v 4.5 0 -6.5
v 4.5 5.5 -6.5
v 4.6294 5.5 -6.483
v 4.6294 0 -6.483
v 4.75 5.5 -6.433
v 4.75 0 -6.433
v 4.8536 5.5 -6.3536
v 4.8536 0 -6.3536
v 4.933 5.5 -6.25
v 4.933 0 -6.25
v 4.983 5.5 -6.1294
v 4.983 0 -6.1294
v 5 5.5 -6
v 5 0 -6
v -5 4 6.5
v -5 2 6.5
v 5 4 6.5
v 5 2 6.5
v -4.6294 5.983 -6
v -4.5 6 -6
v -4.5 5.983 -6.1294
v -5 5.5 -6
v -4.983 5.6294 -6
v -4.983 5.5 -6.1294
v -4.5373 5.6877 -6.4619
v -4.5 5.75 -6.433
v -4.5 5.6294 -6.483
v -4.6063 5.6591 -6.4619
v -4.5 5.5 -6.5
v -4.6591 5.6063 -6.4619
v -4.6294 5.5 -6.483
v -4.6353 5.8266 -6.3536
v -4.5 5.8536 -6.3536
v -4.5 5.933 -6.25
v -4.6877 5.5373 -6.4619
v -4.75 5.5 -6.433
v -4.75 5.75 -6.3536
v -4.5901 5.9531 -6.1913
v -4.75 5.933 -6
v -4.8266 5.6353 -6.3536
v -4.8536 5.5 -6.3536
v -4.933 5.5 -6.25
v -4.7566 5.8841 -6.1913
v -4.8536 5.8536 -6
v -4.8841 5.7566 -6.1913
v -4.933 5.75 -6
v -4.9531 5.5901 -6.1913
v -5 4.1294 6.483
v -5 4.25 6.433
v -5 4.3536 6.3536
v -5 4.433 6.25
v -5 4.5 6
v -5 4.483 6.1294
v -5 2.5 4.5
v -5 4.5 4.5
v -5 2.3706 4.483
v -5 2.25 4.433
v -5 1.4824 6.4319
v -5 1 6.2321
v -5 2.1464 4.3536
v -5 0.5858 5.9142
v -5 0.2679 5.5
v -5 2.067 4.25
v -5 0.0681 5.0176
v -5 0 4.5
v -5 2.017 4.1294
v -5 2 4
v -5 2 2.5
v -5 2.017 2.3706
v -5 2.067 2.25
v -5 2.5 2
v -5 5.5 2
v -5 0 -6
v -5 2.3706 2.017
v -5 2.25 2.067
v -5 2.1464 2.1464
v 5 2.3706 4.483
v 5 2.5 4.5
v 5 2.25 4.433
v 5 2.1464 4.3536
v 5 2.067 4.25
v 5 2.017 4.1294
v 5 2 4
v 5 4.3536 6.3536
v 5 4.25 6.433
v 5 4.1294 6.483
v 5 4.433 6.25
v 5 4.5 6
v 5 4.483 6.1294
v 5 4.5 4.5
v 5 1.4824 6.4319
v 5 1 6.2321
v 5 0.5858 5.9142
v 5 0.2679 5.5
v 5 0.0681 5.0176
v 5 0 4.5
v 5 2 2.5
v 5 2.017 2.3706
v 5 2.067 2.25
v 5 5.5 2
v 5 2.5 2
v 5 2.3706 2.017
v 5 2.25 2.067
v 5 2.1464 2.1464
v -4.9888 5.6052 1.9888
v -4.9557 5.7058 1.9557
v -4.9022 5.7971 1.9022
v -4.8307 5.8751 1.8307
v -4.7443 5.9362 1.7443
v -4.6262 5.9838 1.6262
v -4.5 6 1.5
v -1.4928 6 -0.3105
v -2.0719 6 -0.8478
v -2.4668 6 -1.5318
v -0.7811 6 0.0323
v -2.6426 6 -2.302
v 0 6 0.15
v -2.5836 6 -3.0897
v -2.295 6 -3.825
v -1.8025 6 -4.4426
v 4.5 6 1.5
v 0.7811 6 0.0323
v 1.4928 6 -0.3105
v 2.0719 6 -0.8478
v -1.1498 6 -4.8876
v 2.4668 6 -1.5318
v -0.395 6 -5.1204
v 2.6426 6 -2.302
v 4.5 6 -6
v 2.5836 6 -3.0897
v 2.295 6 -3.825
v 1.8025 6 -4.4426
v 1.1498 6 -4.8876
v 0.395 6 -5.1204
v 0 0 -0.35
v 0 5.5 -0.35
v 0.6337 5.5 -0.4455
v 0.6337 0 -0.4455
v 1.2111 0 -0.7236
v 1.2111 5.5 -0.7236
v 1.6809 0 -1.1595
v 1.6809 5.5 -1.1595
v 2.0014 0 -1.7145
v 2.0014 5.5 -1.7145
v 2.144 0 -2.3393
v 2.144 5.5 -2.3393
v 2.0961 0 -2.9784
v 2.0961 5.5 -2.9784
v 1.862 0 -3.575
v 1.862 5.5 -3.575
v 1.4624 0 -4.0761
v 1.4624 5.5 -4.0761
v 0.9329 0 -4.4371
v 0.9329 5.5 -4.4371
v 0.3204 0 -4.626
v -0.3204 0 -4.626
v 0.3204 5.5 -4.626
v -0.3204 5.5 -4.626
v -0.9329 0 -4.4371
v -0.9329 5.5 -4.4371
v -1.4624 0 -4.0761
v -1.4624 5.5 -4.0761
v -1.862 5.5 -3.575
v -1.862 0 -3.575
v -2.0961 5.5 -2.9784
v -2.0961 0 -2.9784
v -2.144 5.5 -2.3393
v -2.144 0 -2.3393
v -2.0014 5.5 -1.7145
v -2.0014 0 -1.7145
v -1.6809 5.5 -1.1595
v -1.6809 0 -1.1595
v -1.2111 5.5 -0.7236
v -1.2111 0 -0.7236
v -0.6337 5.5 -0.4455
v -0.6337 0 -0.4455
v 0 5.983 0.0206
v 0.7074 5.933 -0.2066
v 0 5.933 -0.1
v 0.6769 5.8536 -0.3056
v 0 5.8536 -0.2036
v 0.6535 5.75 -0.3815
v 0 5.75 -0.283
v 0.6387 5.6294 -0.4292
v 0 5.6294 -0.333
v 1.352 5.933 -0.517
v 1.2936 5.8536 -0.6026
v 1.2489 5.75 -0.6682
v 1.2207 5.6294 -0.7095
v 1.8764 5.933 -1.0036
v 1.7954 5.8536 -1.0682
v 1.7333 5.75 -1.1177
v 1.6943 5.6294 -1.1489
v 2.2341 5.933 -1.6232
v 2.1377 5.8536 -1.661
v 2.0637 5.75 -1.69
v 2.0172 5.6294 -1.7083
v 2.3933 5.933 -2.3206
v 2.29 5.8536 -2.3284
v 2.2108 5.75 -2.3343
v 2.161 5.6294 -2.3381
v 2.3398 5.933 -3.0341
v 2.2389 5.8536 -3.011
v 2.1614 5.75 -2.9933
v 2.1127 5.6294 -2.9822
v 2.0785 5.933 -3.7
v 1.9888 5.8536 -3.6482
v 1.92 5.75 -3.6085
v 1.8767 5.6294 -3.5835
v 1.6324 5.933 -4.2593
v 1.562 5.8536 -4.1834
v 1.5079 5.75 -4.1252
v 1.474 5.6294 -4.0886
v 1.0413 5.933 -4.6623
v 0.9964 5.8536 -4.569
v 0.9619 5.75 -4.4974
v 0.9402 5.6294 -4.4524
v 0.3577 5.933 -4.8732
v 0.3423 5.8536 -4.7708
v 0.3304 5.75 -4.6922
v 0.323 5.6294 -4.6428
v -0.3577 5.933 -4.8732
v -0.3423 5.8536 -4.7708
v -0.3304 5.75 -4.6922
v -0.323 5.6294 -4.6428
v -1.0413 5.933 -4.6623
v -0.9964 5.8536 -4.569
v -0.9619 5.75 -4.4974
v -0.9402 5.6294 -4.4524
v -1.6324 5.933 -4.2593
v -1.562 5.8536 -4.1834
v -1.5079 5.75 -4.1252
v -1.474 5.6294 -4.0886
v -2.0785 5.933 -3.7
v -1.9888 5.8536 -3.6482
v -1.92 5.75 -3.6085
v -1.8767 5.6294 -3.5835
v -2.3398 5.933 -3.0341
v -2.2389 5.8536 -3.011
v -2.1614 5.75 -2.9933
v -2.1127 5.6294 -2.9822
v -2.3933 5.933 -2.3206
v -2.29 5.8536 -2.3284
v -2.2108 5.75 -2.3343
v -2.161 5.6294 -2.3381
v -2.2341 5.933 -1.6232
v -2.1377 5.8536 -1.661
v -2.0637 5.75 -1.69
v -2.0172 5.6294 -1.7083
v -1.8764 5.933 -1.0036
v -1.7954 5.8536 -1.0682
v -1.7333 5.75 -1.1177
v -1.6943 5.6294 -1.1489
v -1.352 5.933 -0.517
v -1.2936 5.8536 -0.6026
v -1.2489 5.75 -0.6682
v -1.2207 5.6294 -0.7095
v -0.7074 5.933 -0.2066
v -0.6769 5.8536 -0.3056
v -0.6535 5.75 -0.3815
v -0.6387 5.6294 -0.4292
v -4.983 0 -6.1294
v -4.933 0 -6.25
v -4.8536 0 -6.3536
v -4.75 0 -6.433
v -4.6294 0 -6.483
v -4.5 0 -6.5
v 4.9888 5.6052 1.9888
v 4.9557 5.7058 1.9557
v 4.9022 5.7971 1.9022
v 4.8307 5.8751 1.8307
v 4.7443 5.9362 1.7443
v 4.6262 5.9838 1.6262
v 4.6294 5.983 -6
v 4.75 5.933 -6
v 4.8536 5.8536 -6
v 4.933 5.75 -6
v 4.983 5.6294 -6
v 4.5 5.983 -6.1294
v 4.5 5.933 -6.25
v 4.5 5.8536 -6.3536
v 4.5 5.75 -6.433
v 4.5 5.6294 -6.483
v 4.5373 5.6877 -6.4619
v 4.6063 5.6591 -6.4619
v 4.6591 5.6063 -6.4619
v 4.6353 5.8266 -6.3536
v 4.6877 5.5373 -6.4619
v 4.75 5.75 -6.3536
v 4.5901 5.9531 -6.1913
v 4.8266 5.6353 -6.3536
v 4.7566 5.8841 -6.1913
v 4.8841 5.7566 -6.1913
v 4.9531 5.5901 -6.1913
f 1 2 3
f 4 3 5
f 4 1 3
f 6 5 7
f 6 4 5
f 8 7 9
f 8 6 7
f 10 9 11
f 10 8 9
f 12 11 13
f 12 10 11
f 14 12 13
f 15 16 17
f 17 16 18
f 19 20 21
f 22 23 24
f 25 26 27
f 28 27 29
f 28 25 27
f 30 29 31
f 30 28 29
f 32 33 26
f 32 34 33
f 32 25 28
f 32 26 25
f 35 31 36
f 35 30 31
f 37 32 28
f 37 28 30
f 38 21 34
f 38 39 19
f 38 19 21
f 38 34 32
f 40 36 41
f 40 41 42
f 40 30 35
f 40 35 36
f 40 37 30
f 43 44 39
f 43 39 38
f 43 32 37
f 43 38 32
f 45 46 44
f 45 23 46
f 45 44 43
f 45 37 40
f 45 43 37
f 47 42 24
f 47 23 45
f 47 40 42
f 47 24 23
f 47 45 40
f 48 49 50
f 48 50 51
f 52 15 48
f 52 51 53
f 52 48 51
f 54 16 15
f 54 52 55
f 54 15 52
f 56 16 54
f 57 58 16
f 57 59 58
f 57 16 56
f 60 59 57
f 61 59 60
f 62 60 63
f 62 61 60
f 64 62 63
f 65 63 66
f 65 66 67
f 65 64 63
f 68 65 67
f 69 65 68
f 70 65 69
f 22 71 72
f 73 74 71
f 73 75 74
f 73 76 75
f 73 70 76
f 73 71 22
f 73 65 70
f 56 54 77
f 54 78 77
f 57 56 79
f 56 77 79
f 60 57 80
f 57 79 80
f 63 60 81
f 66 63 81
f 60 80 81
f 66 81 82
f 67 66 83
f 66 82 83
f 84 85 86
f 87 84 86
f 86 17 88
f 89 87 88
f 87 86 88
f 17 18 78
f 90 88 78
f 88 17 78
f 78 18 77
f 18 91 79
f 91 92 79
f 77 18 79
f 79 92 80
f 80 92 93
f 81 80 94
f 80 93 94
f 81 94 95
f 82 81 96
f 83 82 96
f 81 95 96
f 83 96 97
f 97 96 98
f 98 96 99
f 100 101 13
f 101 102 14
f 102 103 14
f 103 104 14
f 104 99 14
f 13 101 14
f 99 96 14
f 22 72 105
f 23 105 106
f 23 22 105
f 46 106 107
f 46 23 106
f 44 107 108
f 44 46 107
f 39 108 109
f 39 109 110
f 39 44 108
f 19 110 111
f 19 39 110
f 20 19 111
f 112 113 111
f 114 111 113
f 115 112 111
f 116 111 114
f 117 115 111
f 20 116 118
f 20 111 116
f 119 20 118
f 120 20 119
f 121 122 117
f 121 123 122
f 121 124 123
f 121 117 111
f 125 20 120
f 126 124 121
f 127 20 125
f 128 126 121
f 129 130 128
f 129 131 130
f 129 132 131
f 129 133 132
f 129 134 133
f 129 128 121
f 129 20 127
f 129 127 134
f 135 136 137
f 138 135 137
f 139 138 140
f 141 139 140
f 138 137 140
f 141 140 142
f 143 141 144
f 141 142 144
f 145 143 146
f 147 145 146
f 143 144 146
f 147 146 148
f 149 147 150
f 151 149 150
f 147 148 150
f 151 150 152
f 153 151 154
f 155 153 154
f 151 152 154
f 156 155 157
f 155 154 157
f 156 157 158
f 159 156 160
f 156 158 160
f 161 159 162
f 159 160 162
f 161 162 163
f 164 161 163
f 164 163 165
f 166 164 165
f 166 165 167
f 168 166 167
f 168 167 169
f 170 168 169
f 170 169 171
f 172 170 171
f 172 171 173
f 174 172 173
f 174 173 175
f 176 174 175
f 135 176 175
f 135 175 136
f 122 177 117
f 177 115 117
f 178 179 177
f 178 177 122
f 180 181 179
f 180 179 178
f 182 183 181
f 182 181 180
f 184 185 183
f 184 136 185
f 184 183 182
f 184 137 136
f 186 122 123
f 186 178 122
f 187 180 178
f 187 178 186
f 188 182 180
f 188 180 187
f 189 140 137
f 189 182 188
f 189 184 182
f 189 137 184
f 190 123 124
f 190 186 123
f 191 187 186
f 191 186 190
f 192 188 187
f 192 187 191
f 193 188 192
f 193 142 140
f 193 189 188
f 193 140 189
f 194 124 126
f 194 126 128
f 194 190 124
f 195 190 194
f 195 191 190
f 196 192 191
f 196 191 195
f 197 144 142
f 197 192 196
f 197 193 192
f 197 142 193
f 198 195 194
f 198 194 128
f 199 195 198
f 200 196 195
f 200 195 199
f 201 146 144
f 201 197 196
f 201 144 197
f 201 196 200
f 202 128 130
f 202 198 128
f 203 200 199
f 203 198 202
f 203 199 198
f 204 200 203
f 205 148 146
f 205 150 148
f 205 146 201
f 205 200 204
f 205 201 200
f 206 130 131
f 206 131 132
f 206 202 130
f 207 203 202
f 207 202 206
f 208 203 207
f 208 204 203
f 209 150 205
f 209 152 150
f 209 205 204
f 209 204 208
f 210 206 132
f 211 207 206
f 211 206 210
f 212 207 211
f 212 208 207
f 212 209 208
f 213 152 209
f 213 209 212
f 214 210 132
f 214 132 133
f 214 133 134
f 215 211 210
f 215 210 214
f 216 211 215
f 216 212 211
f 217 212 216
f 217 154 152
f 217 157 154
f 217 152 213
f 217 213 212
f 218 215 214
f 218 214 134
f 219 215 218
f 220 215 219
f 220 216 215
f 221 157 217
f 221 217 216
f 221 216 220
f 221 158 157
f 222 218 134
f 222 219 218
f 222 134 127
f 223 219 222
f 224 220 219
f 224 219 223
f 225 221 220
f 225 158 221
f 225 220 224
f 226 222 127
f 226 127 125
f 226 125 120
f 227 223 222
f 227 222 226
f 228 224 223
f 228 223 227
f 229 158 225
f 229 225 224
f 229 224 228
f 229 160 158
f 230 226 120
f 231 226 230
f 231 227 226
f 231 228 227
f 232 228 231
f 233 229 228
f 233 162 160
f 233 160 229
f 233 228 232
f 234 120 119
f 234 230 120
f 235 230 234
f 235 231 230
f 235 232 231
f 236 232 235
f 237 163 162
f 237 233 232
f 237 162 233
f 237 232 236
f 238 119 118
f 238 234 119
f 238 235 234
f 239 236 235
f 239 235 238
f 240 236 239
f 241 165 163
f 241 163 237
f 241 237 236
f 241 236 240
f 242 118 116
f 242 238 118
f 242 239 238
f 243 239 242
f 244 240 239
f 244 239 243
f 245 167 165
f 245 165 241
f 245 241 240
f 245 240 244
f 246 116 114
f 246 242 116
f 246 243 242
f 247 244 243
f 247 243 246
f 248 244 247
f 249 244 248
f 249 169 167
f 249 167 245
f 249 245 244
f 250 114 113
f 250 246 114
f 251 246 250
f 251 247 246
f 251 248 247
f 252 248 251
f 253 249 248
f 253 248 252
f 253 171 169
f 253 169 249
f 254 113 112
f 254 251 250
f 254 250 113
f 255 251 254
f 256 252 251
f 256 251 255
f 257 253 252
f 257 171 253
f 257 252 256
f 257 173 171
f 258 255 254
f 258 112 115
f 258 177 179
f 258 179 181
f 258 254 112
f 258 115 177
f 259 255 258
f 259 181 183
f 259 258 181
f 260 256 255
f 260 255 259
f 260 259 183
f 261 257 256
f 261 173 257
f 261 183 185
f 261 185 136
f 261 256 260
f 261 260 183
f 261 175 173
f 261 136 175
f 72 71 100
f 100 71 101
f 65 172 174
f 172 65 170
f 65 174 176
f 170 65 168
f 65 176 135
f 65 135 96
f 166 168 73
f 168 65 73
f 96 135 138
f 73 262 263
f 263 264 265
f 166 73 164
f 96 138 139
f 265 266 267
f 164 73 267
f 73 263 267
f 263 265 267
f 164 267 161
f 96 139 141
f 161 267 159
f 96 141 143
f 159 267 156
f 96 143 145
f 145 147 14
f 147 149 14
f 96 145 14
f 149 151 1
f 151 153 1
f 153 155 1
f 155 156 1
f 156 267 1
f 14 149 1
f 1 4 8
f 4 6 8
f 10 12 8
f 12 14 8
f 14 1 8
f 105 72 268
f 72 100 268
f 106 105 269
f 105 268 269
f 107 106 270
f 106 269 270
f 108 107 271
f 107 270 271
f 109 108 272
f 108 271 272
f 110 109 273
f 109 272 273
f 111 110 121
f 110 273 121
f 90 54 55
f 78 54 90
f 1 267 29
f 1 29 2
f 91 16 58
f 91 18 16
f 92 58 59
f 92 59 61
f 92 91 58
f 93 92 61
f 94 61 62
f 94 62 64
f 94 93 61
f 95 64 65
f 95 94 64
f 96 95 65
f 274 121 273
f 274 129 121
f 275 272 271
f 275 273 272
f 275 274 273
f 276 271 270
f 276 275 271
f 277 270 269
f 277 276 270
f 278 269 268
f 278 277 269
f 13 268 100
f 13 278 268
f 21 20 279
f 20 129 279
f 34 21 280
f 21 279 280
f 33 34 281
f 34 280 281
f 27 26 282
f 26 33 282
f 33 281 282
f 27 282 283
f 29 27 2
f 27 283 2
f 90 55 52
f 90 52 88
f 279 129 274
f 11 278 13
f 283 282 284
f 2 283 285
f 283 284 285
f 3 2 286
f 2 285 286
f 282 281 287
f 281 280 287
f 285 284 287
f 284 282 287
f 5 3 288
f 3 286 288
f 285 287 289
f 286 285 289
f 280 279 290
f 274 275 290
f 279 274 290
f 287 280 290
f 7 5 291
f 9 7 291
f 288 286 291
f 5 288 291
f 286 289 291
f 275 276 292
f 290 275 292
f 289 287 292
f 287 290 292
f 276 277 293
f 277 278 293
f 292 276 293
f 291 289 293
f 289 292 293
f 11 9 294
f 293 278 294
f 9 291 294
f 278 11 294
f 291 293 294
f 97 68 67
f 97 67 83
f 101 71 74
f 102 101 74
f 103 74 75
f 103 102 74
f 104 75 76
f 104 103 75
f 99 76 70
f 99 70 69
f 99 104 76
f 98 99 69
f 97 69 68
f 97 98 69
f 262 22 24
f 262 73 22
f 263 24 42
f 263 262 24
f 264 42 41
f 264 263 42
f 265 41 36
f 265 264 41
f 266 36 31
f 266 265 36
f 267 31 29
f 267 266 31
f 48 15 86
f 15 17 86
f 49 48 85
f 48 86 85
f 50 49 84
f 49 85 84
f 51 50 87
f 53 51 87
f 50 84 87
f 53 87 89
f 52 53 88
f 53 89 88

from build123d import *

# Parameters (mm, degrees)
SKETCH1_W           = 10
SKETCH1_H           = 13
BOSS_EXTRUDE1_DEPTH = 2
SKETCH2_W           = 10
SKETCH2_H           = 2
BOSS_EXTRUDE2_DEPTH = 2.5
FILLET1_R           = 2
FILLET2_R           = 0.5
SKETCH3_W           = 10
SKETCH3_H           = 8.5
BOSS_EXTRUDE3_DEPTH = 4
CUT_EXTRUDE1_REACH  = 12.161
SKETCH4_R           = 2.15
FILLET3_R           = 0.5
FILLET4_R           = 0.5


with BuildPart() as part:
    # Sketch1 → Boss-Extrude1 (new body)
    with BuildSketch(Plane(origin=(0, 0, 0), x_dir=(1, 0, 0), z_dir=(0, 1, 0))):
        Rectangle(SKETCH1_W, SKETCH1_H)
    extrude(amount=BOSS_EXTRUDE1_DEPTH)

    # Sketch2 → Boss-Extrude2 (add)
    with BuildSketch(Plane(origin=(0, 2, 0), x_dir=(1, 0, 0), z_dir=(0, 1, 0))):
        with Locations((0, -5.5)):
            Rectangle(SKETCH2_W, SKETCH2_H)
    extrude(amount=BOSS_EXTRUDE2_DEPTH)

    # Fillet1
    fillet1_edges = [part.edges().sort_by_distance(p)[0] for p in [
        (0, 0, 6.5),
    ]]
    fillet(fillet1_edges, radius=FILLET1_R)

    # Fillet2
    fillet2_edges = [part.edges().sort_by_distance(p)[0] for p in [
        (0, 4.5, 6.5),
    ]]
    fillet(fillet2_edges, radius=FILLET2_R)

    # Sketch3 → Boss-Extrude3 (add)
    with BuildSketch(Plane(origin=(0, 2, 0), x_dir=(1, 0, 0), z_dir=(0, 1, 0))):
        with Locations((0, 2.25)):
            Rectangle(SKETCH3_W, SKETCH3_H)
    extrude(amount=BOSS_EXTRUDE3_DEPTH)

    # Sketch4 → Cut-Extrude1 (cut, up to next)
    with BuildSketch(Plane(origin=(0, 6, 0), x_dir=(1, 0, 0), z_dir=(0, 1, 0)), mode=Mode.PRIVATE) as cut_extrude1_sk1:
        with Locations(Location((0, 2.5, 0), (0, 0, 270))):
            Circle(SKETCH4_R)
    cut_extrude1_tool1 = extrude(cut_extrude1_sk1.sketch, amount=-CUT_EXTRUDE1_REACH, mode=Mode.PRIVATE) & part.part
    add(cut_extrude1_tool1.solids().sort_by_distance((0, 6, -2.5))[0], mode=Mode.SUBTRACT)

    # Fillet3
    fillet3_edges = [part.edges().sort_by_distance(p)[0] for p in [
        (0, 2, 4.5),
        (0, 2, 2),
        (-5, 6, -2.25),
        (0, 6, 2),
        (5, 6, -2.25),
        (0, 6, -6.5),
        (-5, 3, -6.5),
        (5, 3, -6.5),
    ]]
    fillet(fillet3_edges, radius=FILLET3_R)

    # Fillet4
    fillet4_edges = [part.edges().sort_by_distance(p)[0] for p in [
        (0, 6, -4.65),
    ]]
    fillet(fillet4_edges, radius=FILLET4_R)


solid = part.part
